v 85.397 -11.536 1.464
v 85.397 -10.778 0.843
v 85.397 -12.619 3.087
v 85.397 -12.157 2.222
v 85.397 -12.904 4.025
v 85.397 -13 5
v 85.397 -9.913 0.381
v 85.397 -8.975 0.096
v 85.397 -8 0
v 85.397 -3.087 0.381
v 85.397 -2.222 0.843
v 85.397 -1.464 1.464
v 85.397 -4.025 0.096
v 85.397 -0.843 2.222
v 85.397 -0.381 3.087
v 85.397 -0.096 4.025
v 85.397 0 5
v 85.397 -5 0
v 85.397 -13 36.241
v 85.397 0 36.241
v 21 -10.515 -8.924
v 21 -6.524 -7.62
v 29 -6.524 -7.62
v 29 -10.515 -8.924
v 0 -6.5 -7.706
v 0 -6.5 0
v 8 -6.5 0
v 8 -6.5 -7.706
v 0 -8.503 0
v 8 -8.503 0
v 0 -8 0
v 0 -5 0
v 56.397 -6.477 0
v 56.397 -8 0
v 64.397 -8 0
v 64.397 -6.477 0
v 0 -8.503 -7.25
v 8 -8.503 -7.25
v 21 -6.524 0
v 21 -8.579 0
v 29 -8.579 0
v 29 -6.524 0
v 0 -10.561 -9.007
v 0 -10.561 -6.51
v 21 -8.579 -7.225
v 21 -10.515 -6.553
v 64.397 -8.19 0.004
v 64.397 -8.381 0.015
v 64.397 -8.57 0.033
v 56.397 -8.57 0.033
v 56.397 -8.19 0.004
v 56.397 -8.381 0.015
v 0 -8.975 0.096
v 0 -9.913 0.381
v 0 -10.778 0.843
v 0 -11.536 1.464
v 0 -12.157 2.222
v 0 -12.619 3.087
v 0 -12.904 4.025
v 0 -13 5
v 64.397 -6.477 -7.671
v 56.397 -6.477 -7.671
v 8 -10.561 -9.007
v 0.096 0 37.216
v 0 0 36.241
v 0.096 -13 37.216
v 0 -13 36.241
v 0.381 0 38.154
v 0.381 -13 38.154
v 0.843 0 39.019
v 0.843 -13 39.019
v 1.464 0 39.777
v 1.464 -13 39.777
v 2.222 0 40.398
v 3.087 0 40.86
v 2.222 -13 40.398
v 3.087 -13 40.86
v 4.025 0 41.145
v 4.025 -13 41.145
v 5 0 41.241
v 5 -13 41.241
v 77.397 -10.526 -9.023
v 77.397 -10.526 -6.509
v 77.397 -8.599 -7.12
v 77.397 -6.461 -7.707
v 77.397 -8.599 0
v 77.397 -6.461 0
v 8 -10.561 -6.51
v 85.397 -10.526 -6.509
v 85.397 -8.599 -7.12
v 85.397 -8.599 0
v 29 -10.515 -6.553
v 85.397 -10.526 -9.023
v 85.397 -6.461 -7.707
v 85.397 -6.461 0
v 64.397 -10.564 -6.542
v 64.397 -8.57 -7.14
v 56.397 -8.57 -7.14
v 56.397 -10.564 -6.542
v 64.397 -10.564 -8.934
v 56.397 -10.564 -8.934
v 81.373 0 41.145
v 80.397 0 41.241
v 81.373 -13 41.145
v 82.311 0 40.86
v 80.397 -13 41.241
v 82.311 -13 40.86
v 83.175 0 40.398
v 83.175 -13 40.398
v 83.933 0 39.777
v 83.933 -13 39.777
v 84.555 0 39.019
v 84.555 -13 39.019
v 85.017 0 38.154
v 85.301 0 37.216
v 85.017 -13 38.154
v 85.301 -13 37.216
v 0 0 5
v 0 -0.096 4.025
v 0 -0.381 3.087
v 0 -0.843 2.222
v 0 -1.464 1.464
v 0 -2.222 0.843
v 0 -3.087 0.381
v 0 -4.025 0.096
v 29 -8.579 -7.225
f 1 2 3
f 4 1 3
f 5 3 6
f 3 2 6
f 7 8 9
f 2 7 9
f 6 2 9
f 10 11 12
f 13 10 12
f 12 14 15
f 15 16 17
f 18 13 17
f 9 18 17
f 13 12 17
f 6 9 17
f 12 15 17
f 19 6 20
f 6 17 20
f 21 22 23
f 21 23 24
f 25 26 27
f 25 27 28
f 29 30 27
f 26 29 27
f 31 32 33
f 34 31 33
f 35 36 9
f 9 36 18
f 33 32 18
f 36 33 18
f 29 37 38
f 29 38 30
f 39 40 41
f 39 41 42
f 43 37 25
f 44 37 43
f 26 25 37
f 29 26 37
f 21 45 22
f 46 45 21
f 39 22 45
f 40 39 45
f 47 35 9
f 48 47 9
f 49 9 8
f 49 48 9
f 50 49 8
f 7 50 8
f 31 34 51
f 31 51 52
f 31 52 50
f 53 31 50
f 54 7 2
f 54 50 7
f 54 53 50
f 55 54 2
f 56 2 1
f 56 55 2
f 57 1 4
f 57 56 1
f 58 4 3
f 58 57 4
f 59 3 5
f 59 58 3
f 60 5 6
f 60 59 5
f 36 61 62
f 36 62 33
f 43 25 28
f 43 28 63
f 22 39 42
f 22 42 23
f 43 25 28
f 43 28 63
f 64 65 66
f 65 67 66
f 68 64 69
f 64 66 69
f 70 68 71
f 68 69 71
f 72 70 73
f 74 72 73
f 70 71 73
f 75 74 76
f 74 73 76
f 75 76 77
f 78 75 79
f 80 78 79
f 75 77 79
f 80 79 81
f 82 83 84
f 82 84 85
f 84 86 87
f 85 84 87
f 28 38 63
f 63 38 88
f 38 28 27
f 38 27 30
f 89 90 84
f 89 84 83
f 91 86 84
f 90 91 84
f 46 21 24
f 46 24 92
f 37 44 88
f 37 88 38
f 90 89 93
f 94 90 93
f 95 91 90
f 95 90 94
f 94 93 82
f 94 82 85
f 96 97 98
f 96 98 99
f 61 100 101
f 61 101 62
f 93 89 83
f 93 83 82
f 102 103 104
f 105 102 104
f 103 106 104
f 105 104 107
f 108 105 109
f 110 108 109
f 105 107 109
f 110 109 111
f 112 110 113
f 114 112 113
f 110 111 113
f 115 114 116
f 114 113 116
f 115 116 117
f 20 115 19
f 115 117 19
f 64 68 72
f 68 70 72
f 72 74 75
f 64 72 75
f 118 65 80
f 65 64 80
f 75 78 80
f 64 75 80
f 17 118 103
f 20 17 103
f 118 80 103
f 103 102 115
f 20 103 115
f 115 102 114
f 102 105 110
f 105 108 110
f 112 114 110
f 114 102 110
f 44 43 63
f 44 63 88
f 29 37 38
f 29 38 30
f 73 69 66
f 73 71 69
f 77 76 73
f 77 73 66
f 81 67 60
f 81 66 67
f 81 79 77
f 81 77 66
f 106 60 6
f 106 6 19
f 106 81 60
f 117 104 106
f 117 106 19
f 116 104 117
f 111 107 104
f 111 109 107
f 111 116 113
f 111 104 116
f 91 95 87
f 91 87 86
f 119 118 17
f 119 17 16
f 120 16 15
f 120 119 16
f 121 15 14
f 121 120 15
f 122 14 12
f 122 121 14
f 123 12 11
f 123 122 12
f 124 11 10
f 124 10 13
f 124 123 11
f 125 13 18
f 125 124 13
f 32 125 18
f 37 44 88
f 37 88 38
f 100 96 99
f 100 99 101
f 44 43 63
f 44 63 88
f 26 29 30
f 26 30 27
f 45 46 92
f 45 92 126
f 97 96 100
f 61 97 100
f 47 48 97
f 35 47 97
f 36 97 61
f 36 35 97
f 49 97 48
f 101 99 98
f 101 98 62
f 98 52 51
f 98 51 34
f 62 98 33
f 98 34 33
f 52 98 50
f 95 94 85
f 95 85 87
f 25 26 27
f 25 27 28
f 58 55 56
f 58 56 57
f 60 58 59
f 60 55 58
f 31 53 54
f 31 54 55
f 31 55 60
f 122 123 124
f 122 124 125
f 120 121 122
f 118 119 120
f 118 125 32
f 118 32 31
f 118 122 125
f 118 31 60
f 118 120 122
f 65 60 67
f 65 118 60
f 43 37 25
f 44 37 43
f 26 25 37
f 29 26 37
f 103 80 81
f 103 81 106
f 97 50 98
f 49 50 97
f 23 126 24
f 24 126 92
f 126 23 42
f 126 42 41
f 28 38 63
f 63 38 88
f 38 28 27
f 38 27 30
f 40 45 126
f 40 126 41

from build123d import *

# Parameters (mm, degrees)
F0_W          = 85.3974372149
F0_H          = 41.2409901619
F1_DEPTH      = 13
F3_DEPTH      = 8
F6_DEPTH      = 8
F9_DEPTH      = 8
F11_DEPTH     = 8
F12_R         = 5
F13_T1_DEPTH  = 110.3974372149
F13_T6_DEPTH  = 110.3974372149
F13_T12_DEPTH = 110.3974372149
F13_T18_DEPTH = 110.3974372149
F13_T25_DEPTH = 110.3974372149
F13_T31_DEPTH = 110.3974372149


# Not quite as in the source:
# - a fillet or chamfer that OpenCascade refuses, or shapes differently, is made with other operations: its cross-section is extruded or revolved along the edge and cut away or added


with BuildPart() as f1:
    # F0 (on Front) → F1 (new body)
    with BuildSketch(Plane.XZ):
        with Locations((42.6987186074, 20.6204950809)):
            Rectangle(F0_W, F0_H)
    extrude(amount=F1_DEPTH)

    # F8 (on offset) → F9 (join)
    with BuildSketch(Plane.YZ.offset(64.3974372149)):
        Polygon((-6.4771878533, 0), (-8.57034605, 0), (-8.57034605, -7.1397153661), (-10.5638308451, -6.5416693687), (-10.5638308451, -8.9338514954), (-6.4771878533, -7.6713105664), align=None)
    extrude(amount=-F9_DEPTH)

    # F12
    f12_edges = [f1.edges().sort_by_distance(p)[0] for p in [
        (0, -6.5, 41.24099),
        (85.397437, -6.5, 41.24099),
    ]]
    fillet(f12_edges, radius=F12_R)

    # F13: fillet of radius 5 on 2 edges, made by hand

    # F13_s2 → F13_t1 (cut)
    with BuildSketch(Plane.YZ.offset(-12.5)):
        with BuildLine():
            ThreePointArc((0, 5), (-1.4644660941, 1.4644660941), (-5, 0))
            Line((-5, 0), (0, 0))
            Line((0, 0), (0, 5))
        make_face()
    extrude(amount=F13_T1_DEPTH, mode=Mode.SUBTRACT)


with BuildPart() as f3:
    # F2 (on face) → F3 (new body)
    with BuildSketch(Plane(origin=(0, 0, 0), x_dir=(0, -1, 0), z_dir=(-1, 0, 0))):
        Polygon((8.5030365735, 0), (6.5, 0), (6.5, -7.7062277123), (10.5613032356, -9.0073291212), (10.5613032356, -6.5101371147), (8.5030365735, -7.2503741831), (8.5030365735, -6.5101371147), align=None)
    extrude(amount=-F3_DEPTH)


with BuildPart() as f6:
    # F5 (on offset) + F3_face (on face) → F6 (new body)
    with BuildSketch(Plane(origin=(21, 0, 0), x_dir=(0, -1, 0), z_dir=(-1, 0, 0))):
        Polygon((8.5787344724, 0), (6.5241577104, 0), (6.5241577104, -7.6201283373), (10.5147780851, -8.9239943773), (10.5147780851, -6.5533285961), (8.5787344724, -7.225017529), align=None)
    with BuildSketch(Plane(origin=(0, -7.9171831416, -4.7191054137), x_dir=(0, -1, 0), z_dir=(-1, 0, 0))):
        Polygon((0.585853432, 4.7191054137), (-1.4171831416, 4.7191054137), (-1.4171831416, -2.9871222987), (2.644120094, -4.2882237076), (2.644120094, -1.791031701), (0.585853432, -2.5312687694), align=None)
    extrude(amount=-F6_DEPTH)


with BuildPart() as f11:
    # F10 (on face) → F11 (new body)
    with BuildSketch(Plane.YZ.offset(85.3974372149)):
        Polygon((-6.4612929709, 0), (-8.5991956294, 0), (-8.5991956294, -7.1200900711), (-10.5256577954, -6.5092607401), (-10.5256577954, -9.0230582282), (-6.4612929709, -7.7074263245), align=None)
    extrude(amount=-F11_DEPTH)


with BuildPart() as f13_tool4:
    # F13_s5 → F13_t6 (new body)
    with BuildSketch(Plane.YZ.offset(-12.5)):
        with BuildLine():
            ThreePointArc((-8, 0), (-11.5355339059, 1.4644660941), (-13, 5))
            Line((-13, 5), (-13, 0))
            Line((-13, 0), (-8, 0))
        make_face()
    extrude(amount=F13_T6_DEPTH)

    split(bisect_by=Plane.YZ.offset(56.3974372149), keep=Keep.BOTTOM)

    split(bisect_by=Plane.XZ.offset(8.57034605), keep=Keep.BOTTOM)


with BuildPart() as f1_1:
    add(f1.part)

    # F13_t3: cut F13_tool4
    add(f13_tool4.part, mode=Mode.SUBTRACT)


with BuildPart() as f13_tool10:
    # F13_s11 → F13_t12 (new body)
    with BuildSketch(Plane.YZ.offset(-12.5)):
        with BuildLine():
            ThreePointArc((-8, 0), (-11.5355339059, 1.4644660941), (-13, 5))
            Line((-13, 5), (-13, 0))
            Line((-13, 0), (-8, 0))
        make_face()
    extrude(amount=F13_T12_DEPTH)

    split(bisect_by=Plane.YZ.offset(56.3974372149), keep=Keep.BOTTOM)

    split(bisect_by=Plane.XZ.offset(8.57034605), keep=Keep.TOP)


with BuildPart() as f1_2:
    add(f1_1.part)

    # F13_t9: cut F13_tool10
    add(f13_tool10.part, mode=Mode.SUBTRACT)


with BuildPart() as f13_tool16:
    # F13_s17 → F13_t18 (new body)
    with BuildSketch(Plane.YZ.offset(-12.5)):
        with BuildLine():
            ThreePointArc((-8, 0), (-11.5355339059, 1.4644660941), (-13, 5))
            Line((-13, 5), (-13, 0))
            Line((-13, 0), (-8, 0))
        make_face()
    extrude(amount=F13_T18_DEPTH)

    split(bisect_by=Plane.YZ.offset(56.3974372149), keep=Keep.TOP)

    split(bisect_by=Plane.XZ.offset(8.57034605), keep=Keep.TOP)

    split(bisect_by=Plane.YZ.offset(64.3974372149), keep=Keep.BOTTOM)


with BuildPart() as f1_3:
    add(f1_2.part)

    # F13_t15: cut F13_tool16
    add(f13_tool16.part, mode=Mode.SUBTRACT)


with BuildPart() as f13_tool23:
    # F13_s24 → F13_t25 (new body)
    with BuildSketch(Plane.YZ.offset(-12.5)):
        with BuildLine():
            ThreePointArc((-8, 0), (-11.5355339059, 1.4644660941), (-13, 5))
            Line((-13, 5), (-13, 0))
            Line((-13, 0), (-8, 0))
        make_face()
    extrude(amount=F13_T25_DEPTH)

    split(bisect_by=Plane.XZ.offset(8.57034605), keep=Keep.BOTTOM)

    split(bisect_by=Plane.YZ.offset(64.3974372149), keep=Keep.TOP)


with BuildPart() as f1_4:
    add(f1_3.part)

    # F13_t22: cut F13_tool23
    add(f13_tool23.part, mode=Mode.SUBTRACT)


with BuildPart() as f13_tool29:
    # F13_s30 → F13_t31 (new body)
    with BuildSketch(Plane.YZ.offset(-12.5)):
        with BuildLine():
            ThreePointArc((-8, 0), (-11.5355339059, 1.4644660941), (-13, 5))
            Line((-13, 5), (-13, 0))
            Line((-13, 0), (-8, 0))
        make_face()
    extrude(amount=F13_T31_DEPTH)

    split(bisect_by=Plane.XZ.offset(8.57034605), keep=Keep.TOP)

    split(bisect_by=Plane.YZ.offset(64.3974372149), keep=Keep.TOP)


with BuildPart() as f1_5:
    add(f1_4.part)

    # F13_t28: cut F13_tool29
    add(f13_tool29.part, mode=Mode.SUBTRACT)


solid = Compound([f3.part, f6.part, f11.part, f1_5.part])
